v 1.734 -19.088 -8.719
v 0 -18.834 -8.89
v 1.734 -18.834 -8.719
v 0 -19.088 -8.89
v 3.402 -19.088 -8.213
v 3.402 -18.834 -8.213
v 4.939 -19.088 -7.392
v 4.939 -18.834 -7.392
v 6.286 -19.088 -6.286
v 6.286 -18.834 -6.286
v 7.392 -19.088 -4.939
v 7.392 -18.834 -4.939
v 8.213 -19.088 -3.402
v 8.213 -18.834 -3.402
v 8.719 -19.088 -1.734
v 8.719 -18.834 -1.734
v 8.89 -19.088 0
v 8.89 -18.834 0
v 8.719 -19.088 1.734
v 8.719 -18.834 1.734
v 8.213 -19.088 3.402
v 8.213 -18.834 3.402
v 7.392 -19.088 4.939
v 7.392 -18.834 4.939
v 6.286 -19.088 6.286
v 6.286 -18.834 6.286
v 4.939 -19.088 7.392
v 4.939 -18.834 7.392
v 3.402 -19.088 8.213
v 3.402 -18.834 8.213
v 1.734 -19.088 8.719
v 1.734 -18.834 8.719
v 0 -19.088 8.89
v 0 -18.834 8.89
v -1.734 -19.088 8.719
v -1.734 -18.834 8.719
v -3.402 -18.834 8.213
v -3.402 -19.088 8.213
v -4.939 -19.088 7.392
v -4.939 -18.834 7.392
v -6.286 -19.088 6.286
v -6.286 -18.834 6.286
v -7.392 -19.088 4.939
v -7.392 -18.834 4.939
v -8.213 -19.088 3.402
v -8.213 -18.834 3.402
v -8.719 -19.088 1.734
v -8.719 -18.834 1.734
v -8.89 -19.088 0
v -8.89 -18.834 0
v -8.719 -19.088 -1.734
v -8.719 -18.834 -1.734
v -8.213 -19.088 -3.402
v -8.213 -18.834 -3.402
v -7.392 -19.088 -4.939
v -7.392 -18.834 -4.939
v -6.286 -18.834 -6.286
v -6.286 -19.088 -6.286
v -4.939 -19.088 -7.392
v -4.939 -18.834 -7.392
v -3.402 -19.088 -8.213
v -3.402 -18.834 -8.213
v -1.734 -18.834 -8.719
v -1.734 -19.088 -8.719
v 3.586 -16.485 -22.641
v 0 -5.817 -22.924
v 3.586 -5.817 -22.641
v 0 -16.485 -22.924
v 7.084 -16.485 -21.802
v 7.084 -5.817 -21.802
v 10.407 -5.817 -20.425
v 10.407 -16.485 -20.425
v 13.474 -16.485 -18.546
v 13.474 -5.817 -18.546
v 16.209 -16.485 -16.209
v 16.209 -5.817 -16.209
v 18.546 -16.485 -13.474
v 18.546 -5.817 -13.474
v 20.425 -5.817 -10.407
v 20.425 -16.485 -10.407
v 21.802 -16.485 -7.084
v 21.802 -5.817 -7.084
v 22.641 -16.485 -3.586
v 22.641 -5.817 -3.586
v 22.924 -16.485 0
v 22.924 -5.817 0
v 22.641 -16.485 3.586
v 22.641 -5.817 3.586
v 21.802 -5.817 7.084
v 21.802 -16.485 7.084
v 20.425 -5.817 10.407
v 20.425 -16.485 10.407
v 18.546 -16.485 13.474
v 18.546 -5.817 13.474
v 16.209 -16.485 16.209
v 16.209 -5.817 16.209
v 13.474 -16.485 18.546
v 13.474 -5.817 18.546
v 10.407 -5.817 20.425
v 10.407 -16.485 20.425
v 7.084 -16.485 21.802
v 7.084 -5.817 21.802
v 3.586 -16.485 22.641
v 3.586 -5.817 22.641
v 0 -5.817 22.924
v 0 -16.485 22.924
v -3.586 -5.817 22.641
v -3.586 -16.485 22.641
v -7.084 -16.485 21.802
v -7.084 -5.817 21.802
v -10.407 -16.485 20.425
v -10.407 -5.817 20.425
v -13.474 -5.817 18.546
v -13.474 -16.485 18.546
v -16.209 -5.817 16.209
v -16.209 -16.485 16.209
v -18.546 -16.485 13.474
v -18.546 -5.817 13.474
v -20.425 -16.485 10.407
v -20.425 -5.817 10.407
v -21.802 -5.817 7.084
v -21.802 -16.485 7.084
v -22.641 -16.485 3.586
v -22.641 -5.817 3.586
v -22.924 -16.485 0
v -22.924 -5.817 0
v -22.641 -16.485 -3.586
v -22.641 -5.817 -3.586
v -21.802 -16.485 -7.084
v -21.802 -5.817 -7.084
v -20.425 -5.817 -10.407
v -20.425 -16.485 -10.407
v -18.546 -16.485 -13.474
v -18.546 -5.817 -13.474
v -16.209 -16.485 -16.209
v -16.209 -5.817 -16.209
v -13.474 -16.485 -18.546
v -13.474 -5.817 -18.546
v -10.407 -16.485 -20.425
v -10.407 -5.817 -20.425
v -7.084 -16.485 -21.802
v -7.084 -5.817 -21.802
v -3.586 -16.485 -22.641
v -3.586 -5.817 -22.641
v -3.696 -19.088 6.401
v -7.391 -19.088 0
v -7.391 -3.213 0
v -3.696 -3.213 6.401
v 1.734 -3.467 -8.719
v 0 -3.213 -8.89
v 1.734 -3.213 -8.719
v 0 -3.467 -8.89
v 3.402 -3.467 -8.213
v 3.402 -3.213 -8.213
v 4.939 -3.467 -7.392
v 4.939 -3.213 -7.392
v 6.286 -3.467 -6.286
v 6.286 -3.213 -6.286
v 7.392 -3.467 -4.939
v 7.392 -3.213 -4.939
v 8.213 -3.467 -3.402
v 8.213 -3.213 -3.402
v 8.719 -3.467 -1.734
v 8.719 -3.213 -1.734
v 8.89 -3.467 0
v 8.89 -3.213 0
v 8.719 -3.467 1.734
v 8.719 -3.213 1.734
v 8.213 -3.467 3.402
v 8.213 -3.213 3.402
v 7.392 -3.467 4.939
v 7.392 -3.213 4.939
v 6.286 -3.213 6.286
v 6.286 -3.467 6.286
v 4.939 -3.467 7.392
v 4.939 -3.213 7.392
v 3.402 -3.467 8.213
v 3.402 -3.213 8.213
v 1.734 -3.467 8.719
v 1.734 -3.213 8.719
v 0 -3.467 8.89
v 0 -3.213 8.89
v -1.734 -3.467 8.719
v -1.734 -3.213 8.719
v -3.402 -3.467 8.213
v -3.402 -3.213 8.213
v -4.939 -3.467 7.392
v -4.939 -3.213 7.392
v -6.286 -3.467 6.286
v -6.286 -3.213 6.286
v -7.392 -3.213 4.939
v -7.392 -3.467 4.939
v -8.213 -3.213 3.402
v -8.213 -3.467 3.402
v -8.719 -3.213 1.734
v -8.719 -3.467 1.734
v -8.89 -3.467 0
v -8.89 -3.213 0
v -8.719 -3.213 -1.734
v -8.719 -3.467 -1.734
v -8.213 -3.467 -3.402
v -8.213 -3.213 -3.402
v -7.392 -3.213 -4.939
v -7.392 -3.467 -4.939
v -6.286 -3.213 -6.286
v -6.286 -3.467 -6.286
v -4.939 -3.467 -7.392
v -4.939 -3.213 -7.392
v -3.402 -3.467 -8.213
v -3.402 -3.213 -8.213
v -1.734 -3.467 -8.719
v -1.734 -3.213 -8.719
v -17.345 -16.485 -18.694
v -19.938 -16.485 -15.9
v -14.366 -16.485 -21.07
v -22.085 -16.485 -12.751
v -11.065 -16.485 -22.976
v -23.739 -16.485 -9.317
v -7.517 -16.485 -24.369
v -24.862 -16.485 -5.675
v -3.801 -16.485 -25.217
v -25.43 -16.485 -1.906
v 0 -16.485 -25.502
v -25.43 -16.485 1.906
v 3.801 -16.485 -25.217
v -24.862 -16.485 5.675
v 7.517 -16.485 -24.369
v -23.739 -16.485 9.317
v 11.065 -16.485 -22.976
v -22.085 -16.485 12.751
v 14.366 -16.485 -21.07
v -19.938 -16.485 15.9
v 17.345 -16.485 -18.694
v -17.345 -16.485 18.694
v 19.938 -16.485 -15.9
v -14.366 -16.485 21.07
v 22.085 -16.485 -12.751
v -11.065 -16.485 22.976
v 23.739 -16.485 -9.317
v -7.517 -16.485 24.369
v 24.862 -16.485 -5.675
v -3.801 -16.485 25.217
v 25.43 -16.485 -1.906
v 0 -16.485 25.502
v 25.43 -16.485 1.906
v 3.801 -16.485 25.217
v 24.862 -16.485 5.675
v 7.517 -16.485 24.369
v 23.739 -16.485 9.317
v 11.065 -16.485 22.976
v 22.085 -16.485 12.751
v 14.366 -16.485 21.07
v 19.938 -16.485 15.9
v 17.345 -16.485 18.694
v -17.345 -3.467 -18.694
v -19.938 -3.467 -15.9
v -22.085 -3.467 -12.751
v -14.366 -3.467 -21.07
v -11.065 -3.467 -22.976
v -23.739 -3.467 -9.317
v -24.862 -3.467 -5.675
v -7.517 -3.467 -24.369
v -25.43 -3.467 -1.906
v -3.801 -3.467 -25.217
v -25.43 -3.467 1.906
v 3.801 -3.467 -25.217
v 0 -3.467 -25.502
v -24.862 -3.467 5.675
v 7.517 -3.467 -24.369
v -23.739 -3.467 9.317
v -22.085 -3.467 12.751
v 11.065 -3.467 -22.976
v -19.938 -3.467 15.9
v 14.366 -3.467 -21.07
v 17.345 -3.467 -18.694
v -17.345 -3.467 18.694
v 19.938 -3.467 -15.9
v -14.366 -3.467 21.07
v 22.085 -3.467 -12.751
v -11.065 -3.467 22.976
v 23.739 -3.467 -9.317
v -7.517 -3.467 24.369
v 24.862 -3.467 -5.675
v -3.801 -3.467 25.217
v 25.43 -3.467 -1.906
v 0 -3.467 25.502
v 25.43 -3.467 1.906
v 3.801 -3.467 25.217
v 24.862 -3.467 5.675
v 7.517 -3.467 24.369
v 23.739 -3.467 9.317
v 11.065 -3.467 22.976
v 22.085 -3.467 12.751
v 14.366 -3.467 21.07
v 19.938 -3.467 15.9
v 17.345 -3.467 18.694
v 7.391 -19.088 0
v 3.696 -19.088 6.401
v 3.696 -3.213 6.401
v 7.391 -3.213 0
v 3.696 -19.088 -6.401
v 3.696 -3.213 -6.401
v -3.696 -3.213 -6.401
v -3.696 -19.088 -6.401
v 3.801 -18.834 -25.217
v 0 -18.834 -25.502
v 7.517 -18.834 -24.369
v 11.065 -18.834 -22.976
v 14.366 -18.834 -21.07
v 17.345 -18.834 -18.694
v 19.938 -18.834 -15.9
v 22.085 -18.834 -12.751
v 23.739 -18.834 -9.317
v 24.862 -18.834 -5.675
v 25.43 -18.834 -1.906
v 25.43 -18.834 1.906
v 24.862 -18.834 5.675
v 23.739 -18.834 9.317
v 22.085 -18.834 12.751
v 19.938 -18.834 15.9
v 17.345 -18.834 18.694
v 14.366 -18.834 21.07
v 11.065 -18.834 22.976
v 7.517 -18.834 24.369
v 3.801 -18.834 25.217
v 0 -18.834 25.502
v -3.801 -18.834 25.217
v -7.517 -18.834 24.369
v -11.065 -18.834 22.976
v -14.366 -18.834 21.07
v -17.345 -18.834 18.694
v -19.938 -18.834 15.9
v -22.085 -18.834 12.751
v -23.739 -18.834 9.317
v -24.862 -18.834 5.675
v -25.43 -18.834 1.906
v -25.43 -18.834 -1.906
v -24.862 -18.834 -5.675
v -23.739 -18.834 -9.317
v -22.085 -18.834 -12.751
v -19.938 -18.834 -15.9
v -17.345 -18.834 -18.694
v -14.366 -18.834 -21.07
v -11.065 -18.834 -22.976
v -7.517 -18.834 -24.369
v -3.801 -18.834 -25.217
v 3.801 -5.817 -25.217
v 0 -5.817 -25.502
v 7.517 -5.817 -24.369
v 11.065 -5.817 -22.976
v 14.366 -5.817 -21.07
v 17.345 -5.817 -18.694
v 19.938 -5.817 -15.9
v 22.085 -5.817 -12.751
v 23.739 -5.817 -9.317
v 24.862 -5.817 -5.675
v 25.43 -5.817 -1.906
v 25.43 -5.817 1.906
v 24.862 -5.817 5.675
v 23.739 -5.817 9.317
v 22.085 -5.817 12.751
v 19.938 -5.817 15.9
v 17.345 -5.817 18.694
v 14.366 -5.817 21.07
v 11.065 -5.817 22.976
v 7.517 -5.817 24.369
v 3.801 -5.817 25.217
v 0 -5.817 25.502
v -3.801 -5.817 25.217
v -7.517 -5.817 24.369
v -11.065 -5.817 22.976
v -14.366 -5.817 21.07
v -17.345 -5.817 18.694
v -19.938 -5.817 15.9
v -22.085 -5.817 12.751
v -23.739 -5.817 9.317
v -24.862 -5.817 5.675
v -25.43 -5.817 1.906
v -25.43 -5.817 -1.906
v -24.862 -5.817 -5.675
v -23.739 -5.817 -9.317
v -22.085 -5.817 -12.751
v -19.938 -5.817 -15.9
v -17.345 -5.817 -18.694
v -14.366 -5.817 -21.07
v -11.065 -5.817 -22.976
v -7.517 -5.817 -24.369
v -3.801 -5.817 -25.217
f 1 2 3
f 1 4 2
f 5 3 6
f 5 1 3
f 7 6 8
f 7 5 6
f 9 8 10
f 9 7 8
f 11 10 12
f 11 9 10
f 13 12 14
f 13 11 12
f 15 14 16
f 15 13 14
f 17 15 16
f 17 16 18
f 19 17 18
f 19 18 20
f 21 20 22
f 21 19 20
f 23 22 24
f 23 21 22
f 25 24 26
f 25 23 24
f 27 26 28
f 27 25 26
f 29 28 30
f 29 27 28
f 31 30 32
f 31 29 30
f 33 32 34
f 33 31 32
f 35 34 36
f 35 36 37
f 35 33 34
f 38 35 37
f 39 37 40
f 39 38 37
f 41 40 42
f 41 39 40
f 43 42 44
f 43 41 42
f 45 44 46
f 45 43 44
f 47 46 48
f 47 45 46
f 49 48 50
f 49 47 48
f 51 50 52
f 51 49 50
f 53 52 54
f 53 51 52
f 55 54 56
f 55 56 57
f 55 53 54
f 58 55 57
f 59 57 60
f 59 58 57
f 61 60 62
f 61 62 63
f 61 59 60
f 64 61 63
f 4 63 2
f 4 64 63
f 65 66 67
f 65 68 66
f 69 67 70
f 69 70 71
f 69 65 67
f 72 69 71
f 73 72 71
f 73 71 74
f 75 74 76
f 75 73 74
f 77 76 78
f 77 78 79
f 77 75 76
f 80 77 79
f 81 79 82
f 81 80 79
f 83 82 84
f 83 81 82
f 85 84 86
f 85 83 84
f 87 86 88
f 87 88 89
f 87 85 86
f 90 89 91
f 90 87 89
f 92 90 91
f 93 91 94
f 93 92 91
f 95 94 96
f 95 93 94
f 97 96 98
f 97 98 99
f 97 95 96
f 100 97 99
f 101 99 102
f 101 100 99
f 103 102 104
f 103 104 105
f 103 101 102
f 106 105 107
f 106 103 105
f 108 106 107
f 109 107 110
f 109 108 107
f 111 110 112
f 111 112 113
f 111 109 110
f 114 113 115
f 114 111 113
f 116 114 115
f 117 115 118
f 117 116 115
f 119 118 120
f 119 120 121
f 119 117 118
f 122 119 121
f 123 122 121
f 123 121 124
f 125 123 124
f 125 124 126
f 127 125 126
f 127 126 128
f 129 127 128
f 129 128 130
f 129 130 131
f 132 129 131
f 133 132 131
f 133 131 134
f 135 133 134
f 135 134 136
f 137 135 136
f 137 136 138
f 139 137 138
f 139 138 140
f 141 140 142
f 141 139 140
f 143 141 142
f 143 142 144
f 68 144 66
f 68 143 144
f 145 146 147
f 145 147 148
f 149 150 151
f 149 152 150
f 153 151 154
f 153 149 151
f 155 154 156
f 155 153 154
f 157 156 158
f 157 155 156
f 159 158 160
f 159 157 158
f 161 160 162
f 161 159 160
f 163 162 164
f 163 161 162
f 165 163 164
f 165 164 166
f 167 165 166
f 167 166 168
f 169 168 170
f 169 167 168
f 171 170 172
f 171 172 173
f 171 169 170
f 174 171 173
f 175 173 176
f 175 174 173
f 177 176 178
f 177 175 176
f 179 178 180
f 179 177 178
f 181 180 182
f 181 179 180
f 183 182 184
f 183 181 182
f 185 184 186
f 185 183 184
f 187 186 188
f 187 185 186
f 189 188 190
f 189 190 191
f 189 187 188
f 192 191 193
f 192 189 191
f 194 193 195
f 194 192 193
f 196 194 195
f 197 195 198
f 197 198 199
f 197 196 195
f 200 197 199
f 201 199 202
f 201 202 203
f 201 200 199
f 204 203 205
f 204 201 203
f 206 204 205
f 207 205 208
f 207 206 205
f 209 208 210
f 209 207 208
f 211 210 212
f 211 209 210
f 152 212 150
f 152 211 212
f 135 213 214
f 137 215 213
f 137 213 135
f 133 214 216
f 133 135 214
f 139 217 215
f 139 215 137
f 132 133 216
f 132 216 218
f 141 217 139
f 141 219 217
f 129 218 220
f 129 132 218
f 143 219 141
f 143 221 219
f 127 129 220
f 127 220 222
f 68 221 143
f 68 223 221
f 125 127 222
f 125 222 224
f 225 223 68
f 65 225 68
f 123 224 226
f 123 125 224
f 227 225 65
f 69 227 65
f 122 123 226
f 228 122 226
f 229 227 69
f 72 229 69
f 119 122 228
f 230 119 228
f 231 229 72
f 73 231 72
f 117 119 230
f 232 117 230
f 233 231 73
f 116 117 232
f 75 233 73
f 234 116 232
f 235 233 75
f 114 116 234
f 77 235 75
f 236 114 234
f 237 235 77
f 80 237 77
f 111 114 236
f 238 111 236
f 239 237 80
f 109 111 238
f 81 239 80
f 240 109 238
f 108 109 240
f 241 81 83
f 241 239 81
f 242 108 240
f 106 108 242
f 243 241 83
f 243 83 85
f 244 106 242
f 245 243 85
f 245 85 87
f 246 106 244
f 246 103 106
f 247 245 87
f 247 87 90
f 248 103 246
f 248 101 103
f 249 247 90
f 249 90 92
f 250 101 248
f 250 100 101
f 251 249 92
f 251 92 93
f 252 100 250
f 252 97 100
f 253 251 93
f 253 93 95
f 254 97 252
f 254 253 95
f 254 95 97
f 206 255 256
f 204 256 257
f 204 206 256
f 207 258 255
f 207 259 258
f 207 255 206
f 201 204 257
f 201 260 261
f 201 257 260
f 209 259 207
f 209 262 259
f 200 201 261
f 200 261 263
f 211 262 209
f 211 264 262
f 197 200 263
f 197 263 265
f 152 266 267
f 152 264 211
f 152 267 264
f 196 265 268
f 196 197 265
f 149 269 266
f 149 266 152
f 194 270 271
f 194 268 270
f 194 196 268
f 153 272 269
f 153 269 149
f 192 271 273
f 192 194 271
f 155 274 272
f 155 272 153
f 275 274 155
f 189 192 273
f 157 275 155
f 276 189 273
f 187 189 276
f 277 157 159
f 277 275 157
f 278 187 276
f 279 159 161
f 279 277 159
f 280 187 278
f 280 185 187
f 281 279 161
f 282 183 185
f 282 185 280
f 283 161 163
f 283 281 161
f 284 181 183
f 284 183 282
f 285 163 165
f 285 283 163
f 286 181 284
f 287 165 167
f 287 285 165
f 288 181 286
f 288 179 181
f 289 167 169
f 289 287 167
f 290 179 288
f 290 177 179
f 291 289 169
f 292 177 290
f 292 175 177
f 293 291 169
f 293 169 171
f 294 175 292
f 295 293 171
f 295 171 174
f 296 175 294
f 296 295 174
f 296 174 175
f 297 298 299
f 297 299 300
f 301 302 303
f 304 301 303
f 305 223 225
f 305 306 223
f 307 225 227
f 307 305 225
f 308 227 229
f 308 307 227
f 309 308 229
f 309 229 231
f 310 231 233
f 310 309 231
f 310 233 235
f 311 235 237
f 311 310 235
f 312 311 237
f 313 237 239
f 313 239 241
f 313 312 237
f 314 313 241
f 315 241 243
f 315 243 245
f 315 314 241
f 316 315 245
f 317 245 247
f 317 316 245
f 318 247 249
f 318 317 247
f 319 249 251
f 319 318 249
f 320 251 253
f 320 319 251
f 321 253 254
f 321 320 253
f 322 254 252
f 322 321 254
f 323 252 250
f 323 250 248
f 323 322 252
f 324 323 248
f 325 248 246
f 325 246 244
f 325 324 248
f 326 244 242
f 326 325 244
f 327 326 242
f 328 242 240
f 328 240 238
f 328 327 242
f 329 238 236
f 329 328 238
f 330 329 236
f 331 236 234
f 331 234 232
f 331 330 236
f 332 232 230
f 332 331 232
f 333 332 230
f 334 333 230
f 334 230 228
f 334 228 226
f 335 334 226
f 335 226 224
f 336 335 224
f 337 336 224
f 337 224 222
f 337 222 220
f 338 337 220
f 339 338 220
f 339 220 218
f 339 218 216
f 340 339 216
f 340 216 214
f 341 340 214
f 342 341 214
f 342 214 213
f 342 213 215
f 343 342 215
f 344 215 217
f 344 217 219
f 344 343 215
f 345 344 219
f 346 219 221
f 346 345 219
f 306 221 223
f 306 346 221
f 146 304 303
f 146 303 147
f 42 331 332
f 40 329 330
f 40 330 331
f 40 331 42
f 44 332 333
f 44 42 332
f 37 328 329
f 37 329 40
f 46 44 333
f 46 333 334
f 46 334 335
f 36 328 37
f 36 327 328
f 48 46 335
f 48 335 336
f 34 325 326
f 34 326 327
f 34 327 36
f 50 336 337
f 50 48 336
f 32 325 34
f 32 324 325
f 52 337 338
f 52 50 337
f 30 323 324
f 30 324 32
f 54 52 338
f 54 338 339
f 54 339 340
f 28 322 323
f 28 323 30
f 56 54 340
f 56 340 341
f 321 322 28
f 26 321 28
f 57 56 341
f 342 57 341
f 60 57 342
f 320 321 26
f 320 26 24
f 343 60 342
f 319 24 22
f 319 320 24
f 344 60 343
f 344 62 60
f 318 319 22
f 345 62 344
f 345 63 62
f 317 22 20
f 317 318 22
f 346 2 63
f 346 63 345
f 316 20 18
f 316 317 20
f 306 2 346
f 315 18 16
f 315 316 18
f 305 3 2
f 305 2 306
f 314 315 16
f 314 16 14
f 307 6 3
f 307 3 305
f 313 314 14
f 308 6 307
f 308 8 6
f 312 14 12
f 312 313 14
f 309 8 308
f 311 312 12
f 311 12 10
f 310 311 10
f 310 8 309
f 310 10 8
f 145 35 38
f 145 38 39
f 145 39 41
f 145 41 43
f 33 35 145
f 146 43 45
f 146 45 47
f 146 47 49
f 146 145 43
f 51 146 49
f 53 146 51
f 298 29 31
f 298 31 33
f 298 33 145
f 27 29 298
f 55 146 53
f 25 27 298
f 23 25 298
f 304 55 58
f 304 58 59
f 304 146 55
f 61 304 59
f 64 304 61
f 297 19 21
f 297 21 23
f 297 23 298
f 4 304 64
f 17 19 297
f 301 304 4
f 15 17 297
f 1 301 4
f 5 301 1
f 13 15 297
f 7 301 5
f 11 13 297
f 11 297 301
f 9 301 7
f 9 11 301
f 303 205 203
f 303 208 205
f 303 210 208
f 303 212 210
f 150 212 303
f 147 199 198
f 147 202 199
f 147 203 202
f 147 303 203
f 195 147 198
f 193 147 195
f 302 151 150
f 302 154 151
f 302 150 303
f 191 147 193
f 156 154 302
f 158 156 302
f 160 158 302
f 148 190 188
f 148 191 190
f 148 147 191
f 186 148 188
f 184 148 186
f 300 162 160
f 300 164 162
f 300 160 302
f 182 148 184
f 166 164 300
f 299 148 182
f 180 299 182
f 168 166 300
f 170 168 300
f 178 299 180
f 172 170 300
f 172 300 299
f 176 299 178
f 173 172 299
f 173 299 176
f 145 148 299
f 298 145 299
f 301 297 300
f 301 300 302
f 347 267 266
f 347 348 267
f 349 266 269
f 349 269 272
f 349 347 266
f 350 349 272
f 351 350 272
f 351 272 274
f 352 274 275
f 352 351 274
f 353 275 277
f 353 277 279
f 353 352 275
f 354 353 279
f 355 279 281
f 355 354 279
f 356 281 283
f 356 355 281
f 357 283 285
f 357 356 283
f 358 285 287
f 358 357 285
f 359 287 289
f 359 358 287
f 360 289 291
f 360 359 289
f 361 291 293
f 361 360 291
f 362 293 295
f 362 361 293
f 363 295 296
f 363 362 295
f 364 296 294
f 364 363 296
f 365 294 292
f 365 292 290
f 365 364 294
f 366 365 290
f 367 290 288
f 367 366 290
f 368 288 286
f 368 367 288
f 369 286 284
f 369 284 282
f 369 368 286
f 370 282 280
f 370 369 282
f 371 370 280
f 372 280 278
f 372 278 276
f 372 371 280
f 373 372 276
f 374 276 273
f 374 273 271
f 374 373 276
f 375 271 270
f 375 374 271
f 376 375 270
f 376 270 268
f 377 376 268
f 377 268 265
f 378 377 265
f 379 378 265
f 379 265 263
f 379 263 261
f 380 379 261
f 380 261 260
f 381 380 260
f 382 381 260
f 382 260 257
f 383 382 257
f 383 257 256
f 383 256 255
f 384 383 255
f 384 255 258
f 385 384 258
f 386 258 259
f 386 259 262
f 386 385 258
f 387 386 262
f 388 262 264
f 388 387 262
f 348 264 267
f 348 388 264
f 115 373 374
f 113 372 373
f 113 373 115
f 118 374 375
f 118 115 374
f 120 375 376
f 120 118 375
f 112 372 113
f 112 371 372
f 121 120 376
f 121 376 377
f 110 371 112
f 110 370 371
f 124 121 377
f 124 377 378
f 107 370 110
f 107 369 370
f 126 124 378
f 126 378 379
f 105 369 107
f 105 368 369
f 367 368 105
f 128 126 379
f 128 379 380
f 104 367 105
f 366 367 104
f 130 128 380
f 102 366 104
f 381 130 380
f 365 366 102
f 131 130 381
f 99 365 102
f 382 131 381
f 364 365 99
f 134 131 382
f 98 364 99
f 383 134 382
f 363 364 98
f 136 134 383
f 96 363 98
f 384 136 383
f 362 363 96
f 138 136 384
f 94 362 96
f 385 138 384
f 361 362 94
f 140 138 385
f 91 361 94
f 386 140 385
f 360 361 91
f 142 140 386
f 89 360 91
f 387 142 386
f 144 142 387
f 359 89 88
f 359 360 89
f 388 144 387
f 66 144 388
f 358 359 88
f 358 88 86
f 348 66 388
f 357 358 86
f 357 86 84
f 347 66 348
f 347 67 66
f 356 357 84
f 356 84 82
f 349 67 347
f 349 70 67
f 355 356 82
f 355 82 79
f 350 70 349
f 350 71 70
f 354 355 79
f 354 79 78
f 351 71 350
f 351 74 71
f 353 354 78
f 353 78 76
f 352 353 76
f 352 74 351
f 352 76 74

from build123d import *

# Parameters (mm, degrees)
CUT_EXTRUDE1_DEPTH      = 1
CUT_EXTRUDE1_DEPTH_BACK = 16.875


with BuildPart() as part:
    # Sketch2 → Revolve1 (revolve)
    with BuildSketch(Plane(origin=(0, 0, 0), x_dir=(0, 0, -1), z_dir=(1, 0, 0))):
        Polygon((2.54, -3.2131), (8.89, -3.2131), (8.89, -3.4671), (25.5016, -3.4671), (25.5016, -5.8166), (22.9235, -5.8166), (22.9235, -16.4846), (25.5016, -16.4846), (25.5016, -18.8341), (8.89, -18.8341), (8.89, -19.0881), (2.54, -19.0881), align=None)
    revolve(axis=Axis((0, 55, 0), (0, -1, 0)))

    # Sketch3 → Cut-Extrude1 (cut, two sides)
    with BuildSketch(Plane(origin=(0, -3.2131, 0), x_dir=(1, 0, 0), z_dir=(0, 1, 0))) as cut_extrude1_sk:
        Polygon((3.695503603, 6.4008), (-3.695503603, 6.4008), (-7.391007206, 0), (-3.695503603, -6.4008), (3.695503603, -6.4008), (7.391007206, 0), align=None)
    extrude(amount=CUT_EXTRUDE1_DEPTH, mode=Mode.SUBTRACT)
    extrude(cut_extrude1_sk.sketch, amount=-CUT_EXTRUDE1_DEPTH_BACK, mode=Mode.SUBTRACT)


solid = part.part
